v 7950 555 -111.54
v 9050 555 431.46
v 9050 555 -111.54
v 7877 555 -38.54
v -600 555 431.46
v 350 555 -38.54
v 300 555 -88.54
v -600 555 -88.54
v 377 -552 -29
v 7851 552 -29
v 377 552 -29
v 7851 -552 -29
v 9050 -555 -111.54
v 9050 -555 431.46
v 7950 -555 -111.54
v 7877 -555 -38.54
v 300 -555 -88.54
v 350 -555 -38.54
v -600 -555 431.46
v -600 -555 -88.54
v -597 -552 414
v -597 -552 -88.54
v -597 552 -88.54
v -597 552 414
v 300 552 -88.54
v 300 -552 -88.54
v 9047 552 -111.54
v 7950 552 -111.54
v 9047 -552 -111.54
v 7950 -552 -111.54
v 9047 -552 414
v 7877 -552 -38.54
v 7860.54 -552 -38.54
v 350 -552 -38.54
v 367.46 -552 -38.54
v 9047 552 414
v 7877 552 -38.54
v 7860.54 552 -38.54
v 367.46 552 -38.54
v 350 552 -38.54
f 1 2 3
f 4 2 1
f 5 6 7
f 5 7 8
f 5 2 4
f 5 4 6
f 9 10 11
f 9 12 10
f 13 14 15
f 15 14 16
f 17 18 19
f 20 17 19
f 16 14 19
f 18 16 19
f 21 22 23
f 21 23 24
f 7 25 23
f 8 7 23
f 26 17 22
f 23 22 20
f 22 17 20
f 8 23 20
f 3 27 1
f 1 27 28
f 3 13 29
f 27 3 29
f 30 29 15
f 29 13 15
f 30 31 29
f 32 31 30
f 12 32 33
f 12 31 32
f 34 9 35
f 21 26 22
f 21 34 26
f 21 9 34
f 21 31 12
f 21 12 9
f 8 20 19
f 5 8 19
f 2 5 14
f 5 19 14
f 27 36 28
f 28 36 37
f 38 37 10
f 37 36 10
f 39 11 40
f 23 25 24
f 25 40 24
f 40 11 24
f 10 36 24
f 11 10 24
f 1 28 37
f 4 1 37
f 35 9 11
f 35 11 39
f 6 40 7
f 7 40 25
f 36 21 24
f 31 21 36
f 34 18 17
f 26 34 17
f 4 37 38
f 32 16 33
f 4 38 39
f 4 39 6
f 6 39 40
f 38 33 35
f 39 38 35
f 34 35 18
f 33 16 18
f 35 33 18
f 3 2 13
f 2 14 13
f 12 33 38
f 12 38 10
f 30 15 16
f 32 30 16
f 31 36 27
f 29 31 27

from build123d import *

# Parameters (mm, degrees)
EXTRUDE032_DEPTH = 552
EXTRUDE012_DEPTH = 555


with BuildPart() as extrude032:
    # Sketch033 → Extrude032 (new body, symmetric)
    with BuildSketch(Plane.XZ):
        Polygon((-597, -103), (-597, 417), (9047, 417), (9047, -122), (7947, -122), (7851, -26), (377, -26), (300, -103), align=None)
    extrude(amount=EXTRUDE032_DEPTH, both=True)


with BuildPart() as extrude032_1:
    # Extrude032 placement: moved
    add(extrude032.part.moved(Location((0, 0, -3))))


with BuildPart() as cut003:
    # Sketch020 → Extrude012 (new body, symmetric)
    with BuildSketch(Plane.XZ):
        Polygon((-600, -88.54), (-600, 431.46), (9050, 431.46), (9050, -111.54), (7950, -111.54), (7877, -38.54), (350, -38.54), (300, -88.54), align=None)
    extrude(amount=EXTRUDE012_DEPTH, both=True)

    # Cut003: cut Extrude032
    add(extrude032_1.part, mode=Mode.SUBTRACT)


solid = cut003.part
